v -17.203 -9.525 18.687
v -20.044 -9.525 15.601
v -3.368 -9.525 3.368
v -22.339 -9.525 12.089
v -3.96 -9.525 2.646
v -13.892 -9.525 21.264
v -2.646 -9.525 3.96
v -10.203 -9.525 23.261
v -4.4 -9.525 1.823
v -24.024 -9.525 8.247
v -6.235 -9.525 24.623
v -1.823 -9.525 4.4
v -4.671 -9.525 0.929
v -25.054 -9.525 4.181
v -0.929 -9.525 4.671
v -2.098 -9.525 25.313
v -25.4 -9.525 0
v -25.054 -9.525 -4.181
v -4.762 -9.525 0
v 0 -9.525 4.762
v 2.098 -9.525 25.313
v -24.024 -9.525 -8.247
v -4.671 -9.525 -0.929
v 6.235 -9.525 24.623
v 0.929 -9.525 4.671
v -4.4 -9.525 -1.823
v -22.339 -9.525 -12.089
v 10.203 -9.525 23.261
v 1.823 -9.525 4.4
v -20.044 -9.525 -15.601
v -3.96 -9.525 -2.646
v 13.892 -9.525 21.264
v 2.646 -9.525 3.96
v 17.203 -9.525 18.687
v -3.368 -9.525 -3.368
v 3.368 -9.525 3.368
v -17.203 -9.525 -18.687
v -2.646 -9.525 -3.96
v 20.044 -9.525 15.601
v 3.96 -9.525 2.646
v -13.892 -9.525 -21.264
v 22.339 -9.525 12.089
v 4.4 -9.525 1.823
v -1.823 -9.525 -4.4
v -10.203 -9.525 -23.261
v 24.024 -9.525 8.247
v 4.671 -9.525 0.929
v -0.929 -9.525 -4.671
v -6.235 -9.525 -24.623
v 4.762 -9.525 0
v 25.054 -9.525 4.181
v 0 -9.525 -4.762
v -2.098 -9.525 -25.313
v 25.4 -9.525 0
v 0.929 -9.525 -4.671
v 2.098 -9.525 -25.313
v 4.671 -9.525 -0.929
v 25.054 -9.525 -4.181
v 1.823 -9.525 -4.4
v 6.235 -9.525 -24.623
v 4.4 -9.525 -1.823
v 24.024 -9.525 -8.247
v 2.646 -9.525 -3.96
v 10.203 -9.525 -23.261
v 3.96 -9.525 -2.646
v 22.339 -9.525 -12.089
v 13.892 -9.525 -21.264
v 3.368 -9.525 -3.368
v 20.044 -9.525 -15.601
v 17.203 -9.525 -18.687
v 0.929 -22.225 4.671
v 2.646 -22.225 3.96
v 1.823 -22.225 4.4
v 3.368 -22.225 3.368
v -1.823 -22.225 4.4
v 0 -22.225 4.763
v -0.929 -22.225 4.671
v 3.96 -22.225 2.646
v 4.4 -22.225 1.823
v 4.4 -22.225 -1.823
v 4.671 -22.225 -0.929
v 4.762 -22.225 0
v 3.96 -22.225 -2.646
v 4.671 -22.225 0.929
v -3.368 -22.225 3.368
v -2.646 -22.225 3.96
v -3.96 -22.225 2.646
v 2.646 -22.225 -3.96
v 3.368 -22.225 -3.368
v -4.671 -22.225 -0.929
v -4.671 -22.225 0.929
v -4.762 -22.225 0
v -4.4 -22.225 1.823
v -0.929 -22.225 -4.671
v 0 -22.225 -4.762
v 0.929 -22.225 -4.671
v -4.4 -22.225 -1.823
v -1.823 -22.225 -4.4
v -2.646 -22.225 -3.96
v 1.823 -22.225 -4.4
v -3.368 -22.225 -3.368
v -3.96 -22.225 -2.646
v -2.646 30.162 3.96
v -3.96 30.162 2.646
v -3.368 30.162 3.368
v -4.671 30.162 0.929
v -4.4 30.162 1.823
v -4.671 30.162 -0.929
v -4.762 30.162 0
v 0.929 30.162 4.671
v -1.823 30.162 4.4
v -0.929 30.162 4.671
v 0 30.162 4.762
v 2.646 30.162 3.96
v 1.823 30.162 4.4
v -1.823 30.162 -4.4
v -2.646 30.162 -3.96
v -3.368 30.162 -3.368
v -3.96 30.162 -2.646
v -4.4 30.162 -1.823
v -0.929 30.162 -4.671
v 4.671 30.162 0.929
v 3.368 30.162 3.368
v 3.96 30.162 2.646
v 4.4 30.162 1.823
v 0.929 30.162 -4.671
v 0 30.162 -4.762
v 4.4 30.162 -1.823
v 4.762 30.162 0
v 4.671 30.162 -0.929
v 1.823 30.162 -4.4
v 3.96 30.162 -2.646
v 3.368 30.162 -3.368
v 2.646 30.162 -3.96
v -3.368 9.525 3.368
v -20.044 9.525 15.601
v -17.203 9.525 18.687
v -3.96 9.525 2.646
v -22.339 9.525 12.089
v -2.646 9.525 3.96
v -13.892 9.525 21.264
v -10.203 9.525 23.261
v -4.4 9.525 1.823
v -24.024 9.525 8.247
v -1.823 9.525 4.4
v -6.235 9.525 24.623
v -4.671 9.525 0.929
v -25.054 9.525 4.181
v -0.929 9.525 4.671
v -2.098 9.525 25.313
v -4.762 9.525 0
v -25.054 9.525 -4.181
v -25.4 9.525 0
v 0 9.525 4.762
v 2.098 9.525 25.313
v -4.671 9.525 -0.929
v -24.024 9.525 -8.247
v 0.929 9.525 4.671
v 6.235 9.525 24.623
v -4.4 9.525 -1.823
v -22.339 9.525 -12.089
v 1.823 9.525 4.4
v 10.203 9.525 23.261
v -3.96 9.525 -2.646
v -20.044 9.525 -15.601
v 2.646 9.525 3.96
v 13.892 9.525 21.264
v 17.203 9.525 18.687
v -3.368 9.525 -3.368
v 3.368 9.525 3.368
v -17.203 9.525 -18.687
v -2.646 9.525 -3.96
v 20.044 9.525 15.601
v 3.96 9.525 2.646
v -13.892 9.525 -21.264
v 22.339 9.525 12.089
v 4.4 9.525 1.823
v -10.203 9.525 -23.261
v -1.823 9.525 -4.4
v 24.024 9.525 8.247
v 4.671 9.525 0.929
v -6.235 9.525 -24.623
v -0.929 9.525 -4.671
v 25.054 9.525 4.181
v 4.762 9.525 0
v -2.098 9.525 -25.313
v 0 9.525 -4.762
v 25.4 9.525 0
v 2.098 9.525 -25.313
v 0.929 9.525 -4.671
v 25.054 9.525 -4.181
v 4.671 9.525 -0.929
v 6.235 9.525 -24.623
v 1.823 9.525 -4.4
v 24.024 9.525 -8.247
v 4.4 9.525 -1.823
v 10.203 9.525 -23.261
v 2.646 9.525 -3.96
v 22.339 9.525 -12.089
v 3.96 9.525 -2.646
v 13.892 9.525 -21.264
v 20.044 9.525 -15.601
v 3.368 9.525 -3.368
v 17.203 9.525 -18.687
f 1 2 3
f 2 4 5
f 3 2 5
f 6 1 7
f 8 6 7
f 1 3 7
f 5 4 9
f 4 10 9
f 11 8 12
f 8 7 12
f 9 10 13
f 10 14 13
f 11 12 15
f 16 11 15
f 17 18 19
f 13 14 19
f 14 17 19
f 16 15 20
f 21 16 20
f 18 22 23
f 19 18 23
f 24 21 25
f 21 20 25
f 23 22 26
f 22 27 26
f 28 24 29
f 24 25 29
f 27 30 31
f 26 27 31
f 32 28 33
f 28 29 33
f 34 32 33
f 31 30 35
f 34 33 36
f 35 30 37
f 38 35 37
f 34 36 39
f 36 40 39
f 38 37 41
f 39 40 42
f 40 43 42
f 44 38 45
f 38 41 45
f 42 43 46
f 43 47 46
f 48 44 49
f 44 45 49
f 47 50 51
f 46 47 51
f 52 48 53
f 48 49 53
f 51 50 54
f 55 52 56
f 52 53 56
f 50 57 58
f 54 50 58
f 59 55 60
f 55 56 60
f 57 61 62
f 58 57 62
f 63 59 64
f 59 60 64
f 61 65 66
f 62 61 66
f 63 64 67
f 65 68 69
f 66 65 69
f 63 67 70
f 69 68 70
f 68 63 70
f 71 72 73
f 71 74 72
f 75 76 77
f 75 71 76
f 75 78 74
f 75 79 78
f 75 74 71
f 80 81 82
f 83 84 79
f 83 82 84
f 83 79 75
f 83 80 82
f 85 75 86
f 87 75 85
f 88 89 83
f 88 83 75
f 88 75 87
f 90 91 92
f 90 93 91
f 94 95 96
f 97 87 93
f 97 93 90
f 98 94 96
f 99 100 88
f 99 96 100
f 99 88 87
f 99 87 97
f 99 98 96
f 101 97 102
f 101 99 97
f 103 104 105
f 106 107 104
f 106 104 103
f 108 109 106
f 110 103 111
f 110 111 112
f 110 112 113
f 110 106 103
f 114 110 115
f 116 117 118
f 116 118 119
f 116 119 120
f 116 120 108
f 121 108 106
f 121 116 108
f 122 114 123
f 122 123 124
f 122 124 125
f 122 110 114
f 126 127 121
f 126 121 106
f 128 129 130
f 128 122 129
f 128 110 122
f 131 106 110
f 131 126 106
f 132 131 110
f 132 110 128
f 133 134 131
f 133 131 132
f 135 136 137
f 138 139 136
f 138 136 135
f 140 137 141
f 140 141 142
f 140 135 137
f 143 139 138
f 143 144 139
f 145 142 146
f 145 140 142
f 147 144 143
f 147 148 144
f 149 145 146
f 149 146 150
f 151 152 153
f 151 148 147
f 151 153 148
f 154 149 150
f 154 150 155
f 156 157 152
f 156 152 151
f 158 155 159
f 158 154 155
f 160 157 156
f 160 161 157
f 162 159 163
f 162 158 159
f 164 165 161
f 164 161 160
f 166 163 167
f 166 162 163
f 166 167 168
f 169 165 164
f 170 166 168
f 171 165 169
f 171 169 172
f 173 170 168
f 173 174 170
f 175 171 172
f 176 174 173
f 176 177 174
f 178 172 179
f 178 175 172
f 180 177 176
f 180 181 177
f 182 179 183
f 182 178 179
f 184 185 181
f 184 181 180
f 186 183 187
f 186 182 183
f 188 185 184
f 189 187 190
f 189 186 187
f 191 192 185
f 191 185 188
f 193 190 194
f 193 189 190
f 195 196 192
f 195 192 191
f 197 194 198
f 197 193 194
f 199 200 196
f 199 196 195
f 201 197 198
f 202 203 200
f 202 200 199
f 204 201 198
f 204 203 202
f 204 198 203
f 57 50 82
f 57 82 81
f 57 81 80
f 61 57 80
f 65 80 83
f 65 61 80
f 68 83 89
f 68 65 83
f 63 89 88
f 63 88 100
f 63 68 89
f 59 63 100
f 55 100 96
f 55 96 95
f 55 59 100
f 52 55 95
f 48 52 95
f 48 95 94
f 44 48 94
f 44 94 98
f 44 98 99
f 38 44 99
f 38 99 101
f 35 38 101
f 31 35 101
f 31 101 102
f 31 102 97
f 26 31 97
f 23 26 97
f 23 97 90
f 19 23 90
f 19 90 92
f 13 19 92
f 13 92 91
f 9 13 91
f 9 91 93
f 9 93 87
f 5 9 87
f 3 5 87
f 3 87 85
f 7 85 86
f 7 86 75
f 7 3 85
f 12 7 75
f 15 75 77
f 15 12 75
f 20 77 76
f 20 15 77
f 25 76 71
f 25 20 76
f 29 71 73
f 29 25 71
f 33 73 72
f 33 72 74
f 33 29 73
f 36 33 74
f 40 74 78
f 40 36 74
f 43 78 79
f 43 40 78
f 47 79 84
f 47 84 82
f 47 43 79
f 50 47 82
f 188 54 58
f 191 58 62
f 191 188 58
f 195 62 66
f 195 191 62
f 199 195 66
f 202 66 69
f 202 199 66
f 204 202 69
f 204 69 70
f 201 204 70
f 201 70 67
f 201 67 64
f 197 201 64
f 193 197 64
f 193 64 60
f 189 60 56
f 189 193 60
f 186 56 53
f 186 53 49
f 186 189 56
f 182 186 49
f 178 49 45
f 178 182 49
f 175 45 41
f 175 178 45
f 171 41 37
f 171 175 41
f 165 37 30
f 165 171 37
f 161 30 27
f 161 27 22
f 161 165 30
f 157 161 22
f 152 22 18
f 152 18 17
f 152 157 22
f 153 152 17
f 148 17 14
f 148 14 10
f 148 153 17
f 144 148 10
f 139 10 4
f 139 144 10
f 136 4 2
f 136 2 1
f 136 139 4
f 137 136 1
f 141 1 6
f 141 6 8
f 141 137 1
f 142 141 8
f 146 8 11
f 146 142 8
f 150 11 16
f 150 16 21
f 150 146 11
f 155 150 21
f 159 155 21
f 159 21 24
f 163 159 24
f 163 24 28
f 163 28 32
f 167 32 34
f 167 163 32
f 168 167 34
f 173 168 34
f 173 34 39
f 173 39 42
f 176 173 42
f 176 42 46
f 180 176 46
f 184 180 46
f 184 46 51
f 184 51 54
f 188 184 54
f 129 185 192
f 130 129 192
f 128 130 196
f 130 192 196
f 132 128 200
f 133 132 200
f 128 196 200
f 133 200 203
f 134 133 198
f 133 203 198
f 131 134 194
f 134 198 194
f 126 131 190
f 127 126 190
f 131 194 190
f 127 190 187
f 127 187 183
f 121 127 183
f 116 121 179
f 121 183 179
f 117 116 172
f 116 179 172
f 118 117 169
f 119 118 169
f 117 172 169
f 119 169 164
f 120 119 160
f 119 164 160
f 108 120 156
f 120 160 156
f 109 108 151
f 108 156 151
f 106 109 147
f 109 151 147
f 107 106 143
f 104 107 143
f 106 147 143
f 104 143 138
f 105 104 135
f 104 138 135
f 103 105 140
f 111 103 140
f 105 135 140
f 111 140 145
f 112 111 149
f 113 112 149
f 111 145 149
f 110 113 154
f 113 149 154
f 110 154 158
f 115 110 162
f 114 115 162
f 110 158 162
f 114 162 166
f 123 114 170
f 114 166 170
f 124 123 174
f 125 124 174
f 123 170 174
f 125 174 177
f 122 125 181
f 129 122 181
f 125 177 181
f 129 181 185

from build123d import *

# Parameters (mm, degrees)
SKETCH1_R           = 25.4
BOSS_EXTRUDE1_DEPTH = 9.525
SKETCH2_R           = 4.7625
BOSS_EXTRUDE2_DEPTH = 20.6375
SKETCH3_R           = 4.7625
CUT_EXTRUDE1_DEPTH  = 7.9375


with BuildPart() as part:
    # Sketch1 → Boss-Extrude1 (new body, symmetric)
    with BuildSketch(Plane(origin=(0, 0, 0), x_dir=(1, 0, 0), z_dir=(0, 1, 0))):
        Circle(SKETCH1_R)
    extrude(amount=BOSS_EXTRUDE1_DEPTH, both=True)

    # Sketch2 → Boss-Extrude2 (add)
    with BuildSketch(Plane(origin=(0, 9.525, 0), x_dir=(1, 0, 0), z_dir=(0, 1, 0))):
        Circle(SKETCH2_R)
    boss_extrude2 = extrude(amount=BOSS_EXTRUDE2_DEPTH)

    # Mirror1: Boss-Extrude2 across plane
    add(boss_extrude2.mirror(Plane.ZX))

    # Sketch3 → Cut-Extrude1 (cut)
    with BuildSketch(Plane(origin=(0, -30.1625, 0), x_dir=(-1, 0, 0), z_dir=(0, -1, 0))):
        Circle(SKETCH3_R)
    extrude(amount=-CUT_EXTRUDE1_DEPTH, mode=Mode.SUBTRACT)


solid = part.part
